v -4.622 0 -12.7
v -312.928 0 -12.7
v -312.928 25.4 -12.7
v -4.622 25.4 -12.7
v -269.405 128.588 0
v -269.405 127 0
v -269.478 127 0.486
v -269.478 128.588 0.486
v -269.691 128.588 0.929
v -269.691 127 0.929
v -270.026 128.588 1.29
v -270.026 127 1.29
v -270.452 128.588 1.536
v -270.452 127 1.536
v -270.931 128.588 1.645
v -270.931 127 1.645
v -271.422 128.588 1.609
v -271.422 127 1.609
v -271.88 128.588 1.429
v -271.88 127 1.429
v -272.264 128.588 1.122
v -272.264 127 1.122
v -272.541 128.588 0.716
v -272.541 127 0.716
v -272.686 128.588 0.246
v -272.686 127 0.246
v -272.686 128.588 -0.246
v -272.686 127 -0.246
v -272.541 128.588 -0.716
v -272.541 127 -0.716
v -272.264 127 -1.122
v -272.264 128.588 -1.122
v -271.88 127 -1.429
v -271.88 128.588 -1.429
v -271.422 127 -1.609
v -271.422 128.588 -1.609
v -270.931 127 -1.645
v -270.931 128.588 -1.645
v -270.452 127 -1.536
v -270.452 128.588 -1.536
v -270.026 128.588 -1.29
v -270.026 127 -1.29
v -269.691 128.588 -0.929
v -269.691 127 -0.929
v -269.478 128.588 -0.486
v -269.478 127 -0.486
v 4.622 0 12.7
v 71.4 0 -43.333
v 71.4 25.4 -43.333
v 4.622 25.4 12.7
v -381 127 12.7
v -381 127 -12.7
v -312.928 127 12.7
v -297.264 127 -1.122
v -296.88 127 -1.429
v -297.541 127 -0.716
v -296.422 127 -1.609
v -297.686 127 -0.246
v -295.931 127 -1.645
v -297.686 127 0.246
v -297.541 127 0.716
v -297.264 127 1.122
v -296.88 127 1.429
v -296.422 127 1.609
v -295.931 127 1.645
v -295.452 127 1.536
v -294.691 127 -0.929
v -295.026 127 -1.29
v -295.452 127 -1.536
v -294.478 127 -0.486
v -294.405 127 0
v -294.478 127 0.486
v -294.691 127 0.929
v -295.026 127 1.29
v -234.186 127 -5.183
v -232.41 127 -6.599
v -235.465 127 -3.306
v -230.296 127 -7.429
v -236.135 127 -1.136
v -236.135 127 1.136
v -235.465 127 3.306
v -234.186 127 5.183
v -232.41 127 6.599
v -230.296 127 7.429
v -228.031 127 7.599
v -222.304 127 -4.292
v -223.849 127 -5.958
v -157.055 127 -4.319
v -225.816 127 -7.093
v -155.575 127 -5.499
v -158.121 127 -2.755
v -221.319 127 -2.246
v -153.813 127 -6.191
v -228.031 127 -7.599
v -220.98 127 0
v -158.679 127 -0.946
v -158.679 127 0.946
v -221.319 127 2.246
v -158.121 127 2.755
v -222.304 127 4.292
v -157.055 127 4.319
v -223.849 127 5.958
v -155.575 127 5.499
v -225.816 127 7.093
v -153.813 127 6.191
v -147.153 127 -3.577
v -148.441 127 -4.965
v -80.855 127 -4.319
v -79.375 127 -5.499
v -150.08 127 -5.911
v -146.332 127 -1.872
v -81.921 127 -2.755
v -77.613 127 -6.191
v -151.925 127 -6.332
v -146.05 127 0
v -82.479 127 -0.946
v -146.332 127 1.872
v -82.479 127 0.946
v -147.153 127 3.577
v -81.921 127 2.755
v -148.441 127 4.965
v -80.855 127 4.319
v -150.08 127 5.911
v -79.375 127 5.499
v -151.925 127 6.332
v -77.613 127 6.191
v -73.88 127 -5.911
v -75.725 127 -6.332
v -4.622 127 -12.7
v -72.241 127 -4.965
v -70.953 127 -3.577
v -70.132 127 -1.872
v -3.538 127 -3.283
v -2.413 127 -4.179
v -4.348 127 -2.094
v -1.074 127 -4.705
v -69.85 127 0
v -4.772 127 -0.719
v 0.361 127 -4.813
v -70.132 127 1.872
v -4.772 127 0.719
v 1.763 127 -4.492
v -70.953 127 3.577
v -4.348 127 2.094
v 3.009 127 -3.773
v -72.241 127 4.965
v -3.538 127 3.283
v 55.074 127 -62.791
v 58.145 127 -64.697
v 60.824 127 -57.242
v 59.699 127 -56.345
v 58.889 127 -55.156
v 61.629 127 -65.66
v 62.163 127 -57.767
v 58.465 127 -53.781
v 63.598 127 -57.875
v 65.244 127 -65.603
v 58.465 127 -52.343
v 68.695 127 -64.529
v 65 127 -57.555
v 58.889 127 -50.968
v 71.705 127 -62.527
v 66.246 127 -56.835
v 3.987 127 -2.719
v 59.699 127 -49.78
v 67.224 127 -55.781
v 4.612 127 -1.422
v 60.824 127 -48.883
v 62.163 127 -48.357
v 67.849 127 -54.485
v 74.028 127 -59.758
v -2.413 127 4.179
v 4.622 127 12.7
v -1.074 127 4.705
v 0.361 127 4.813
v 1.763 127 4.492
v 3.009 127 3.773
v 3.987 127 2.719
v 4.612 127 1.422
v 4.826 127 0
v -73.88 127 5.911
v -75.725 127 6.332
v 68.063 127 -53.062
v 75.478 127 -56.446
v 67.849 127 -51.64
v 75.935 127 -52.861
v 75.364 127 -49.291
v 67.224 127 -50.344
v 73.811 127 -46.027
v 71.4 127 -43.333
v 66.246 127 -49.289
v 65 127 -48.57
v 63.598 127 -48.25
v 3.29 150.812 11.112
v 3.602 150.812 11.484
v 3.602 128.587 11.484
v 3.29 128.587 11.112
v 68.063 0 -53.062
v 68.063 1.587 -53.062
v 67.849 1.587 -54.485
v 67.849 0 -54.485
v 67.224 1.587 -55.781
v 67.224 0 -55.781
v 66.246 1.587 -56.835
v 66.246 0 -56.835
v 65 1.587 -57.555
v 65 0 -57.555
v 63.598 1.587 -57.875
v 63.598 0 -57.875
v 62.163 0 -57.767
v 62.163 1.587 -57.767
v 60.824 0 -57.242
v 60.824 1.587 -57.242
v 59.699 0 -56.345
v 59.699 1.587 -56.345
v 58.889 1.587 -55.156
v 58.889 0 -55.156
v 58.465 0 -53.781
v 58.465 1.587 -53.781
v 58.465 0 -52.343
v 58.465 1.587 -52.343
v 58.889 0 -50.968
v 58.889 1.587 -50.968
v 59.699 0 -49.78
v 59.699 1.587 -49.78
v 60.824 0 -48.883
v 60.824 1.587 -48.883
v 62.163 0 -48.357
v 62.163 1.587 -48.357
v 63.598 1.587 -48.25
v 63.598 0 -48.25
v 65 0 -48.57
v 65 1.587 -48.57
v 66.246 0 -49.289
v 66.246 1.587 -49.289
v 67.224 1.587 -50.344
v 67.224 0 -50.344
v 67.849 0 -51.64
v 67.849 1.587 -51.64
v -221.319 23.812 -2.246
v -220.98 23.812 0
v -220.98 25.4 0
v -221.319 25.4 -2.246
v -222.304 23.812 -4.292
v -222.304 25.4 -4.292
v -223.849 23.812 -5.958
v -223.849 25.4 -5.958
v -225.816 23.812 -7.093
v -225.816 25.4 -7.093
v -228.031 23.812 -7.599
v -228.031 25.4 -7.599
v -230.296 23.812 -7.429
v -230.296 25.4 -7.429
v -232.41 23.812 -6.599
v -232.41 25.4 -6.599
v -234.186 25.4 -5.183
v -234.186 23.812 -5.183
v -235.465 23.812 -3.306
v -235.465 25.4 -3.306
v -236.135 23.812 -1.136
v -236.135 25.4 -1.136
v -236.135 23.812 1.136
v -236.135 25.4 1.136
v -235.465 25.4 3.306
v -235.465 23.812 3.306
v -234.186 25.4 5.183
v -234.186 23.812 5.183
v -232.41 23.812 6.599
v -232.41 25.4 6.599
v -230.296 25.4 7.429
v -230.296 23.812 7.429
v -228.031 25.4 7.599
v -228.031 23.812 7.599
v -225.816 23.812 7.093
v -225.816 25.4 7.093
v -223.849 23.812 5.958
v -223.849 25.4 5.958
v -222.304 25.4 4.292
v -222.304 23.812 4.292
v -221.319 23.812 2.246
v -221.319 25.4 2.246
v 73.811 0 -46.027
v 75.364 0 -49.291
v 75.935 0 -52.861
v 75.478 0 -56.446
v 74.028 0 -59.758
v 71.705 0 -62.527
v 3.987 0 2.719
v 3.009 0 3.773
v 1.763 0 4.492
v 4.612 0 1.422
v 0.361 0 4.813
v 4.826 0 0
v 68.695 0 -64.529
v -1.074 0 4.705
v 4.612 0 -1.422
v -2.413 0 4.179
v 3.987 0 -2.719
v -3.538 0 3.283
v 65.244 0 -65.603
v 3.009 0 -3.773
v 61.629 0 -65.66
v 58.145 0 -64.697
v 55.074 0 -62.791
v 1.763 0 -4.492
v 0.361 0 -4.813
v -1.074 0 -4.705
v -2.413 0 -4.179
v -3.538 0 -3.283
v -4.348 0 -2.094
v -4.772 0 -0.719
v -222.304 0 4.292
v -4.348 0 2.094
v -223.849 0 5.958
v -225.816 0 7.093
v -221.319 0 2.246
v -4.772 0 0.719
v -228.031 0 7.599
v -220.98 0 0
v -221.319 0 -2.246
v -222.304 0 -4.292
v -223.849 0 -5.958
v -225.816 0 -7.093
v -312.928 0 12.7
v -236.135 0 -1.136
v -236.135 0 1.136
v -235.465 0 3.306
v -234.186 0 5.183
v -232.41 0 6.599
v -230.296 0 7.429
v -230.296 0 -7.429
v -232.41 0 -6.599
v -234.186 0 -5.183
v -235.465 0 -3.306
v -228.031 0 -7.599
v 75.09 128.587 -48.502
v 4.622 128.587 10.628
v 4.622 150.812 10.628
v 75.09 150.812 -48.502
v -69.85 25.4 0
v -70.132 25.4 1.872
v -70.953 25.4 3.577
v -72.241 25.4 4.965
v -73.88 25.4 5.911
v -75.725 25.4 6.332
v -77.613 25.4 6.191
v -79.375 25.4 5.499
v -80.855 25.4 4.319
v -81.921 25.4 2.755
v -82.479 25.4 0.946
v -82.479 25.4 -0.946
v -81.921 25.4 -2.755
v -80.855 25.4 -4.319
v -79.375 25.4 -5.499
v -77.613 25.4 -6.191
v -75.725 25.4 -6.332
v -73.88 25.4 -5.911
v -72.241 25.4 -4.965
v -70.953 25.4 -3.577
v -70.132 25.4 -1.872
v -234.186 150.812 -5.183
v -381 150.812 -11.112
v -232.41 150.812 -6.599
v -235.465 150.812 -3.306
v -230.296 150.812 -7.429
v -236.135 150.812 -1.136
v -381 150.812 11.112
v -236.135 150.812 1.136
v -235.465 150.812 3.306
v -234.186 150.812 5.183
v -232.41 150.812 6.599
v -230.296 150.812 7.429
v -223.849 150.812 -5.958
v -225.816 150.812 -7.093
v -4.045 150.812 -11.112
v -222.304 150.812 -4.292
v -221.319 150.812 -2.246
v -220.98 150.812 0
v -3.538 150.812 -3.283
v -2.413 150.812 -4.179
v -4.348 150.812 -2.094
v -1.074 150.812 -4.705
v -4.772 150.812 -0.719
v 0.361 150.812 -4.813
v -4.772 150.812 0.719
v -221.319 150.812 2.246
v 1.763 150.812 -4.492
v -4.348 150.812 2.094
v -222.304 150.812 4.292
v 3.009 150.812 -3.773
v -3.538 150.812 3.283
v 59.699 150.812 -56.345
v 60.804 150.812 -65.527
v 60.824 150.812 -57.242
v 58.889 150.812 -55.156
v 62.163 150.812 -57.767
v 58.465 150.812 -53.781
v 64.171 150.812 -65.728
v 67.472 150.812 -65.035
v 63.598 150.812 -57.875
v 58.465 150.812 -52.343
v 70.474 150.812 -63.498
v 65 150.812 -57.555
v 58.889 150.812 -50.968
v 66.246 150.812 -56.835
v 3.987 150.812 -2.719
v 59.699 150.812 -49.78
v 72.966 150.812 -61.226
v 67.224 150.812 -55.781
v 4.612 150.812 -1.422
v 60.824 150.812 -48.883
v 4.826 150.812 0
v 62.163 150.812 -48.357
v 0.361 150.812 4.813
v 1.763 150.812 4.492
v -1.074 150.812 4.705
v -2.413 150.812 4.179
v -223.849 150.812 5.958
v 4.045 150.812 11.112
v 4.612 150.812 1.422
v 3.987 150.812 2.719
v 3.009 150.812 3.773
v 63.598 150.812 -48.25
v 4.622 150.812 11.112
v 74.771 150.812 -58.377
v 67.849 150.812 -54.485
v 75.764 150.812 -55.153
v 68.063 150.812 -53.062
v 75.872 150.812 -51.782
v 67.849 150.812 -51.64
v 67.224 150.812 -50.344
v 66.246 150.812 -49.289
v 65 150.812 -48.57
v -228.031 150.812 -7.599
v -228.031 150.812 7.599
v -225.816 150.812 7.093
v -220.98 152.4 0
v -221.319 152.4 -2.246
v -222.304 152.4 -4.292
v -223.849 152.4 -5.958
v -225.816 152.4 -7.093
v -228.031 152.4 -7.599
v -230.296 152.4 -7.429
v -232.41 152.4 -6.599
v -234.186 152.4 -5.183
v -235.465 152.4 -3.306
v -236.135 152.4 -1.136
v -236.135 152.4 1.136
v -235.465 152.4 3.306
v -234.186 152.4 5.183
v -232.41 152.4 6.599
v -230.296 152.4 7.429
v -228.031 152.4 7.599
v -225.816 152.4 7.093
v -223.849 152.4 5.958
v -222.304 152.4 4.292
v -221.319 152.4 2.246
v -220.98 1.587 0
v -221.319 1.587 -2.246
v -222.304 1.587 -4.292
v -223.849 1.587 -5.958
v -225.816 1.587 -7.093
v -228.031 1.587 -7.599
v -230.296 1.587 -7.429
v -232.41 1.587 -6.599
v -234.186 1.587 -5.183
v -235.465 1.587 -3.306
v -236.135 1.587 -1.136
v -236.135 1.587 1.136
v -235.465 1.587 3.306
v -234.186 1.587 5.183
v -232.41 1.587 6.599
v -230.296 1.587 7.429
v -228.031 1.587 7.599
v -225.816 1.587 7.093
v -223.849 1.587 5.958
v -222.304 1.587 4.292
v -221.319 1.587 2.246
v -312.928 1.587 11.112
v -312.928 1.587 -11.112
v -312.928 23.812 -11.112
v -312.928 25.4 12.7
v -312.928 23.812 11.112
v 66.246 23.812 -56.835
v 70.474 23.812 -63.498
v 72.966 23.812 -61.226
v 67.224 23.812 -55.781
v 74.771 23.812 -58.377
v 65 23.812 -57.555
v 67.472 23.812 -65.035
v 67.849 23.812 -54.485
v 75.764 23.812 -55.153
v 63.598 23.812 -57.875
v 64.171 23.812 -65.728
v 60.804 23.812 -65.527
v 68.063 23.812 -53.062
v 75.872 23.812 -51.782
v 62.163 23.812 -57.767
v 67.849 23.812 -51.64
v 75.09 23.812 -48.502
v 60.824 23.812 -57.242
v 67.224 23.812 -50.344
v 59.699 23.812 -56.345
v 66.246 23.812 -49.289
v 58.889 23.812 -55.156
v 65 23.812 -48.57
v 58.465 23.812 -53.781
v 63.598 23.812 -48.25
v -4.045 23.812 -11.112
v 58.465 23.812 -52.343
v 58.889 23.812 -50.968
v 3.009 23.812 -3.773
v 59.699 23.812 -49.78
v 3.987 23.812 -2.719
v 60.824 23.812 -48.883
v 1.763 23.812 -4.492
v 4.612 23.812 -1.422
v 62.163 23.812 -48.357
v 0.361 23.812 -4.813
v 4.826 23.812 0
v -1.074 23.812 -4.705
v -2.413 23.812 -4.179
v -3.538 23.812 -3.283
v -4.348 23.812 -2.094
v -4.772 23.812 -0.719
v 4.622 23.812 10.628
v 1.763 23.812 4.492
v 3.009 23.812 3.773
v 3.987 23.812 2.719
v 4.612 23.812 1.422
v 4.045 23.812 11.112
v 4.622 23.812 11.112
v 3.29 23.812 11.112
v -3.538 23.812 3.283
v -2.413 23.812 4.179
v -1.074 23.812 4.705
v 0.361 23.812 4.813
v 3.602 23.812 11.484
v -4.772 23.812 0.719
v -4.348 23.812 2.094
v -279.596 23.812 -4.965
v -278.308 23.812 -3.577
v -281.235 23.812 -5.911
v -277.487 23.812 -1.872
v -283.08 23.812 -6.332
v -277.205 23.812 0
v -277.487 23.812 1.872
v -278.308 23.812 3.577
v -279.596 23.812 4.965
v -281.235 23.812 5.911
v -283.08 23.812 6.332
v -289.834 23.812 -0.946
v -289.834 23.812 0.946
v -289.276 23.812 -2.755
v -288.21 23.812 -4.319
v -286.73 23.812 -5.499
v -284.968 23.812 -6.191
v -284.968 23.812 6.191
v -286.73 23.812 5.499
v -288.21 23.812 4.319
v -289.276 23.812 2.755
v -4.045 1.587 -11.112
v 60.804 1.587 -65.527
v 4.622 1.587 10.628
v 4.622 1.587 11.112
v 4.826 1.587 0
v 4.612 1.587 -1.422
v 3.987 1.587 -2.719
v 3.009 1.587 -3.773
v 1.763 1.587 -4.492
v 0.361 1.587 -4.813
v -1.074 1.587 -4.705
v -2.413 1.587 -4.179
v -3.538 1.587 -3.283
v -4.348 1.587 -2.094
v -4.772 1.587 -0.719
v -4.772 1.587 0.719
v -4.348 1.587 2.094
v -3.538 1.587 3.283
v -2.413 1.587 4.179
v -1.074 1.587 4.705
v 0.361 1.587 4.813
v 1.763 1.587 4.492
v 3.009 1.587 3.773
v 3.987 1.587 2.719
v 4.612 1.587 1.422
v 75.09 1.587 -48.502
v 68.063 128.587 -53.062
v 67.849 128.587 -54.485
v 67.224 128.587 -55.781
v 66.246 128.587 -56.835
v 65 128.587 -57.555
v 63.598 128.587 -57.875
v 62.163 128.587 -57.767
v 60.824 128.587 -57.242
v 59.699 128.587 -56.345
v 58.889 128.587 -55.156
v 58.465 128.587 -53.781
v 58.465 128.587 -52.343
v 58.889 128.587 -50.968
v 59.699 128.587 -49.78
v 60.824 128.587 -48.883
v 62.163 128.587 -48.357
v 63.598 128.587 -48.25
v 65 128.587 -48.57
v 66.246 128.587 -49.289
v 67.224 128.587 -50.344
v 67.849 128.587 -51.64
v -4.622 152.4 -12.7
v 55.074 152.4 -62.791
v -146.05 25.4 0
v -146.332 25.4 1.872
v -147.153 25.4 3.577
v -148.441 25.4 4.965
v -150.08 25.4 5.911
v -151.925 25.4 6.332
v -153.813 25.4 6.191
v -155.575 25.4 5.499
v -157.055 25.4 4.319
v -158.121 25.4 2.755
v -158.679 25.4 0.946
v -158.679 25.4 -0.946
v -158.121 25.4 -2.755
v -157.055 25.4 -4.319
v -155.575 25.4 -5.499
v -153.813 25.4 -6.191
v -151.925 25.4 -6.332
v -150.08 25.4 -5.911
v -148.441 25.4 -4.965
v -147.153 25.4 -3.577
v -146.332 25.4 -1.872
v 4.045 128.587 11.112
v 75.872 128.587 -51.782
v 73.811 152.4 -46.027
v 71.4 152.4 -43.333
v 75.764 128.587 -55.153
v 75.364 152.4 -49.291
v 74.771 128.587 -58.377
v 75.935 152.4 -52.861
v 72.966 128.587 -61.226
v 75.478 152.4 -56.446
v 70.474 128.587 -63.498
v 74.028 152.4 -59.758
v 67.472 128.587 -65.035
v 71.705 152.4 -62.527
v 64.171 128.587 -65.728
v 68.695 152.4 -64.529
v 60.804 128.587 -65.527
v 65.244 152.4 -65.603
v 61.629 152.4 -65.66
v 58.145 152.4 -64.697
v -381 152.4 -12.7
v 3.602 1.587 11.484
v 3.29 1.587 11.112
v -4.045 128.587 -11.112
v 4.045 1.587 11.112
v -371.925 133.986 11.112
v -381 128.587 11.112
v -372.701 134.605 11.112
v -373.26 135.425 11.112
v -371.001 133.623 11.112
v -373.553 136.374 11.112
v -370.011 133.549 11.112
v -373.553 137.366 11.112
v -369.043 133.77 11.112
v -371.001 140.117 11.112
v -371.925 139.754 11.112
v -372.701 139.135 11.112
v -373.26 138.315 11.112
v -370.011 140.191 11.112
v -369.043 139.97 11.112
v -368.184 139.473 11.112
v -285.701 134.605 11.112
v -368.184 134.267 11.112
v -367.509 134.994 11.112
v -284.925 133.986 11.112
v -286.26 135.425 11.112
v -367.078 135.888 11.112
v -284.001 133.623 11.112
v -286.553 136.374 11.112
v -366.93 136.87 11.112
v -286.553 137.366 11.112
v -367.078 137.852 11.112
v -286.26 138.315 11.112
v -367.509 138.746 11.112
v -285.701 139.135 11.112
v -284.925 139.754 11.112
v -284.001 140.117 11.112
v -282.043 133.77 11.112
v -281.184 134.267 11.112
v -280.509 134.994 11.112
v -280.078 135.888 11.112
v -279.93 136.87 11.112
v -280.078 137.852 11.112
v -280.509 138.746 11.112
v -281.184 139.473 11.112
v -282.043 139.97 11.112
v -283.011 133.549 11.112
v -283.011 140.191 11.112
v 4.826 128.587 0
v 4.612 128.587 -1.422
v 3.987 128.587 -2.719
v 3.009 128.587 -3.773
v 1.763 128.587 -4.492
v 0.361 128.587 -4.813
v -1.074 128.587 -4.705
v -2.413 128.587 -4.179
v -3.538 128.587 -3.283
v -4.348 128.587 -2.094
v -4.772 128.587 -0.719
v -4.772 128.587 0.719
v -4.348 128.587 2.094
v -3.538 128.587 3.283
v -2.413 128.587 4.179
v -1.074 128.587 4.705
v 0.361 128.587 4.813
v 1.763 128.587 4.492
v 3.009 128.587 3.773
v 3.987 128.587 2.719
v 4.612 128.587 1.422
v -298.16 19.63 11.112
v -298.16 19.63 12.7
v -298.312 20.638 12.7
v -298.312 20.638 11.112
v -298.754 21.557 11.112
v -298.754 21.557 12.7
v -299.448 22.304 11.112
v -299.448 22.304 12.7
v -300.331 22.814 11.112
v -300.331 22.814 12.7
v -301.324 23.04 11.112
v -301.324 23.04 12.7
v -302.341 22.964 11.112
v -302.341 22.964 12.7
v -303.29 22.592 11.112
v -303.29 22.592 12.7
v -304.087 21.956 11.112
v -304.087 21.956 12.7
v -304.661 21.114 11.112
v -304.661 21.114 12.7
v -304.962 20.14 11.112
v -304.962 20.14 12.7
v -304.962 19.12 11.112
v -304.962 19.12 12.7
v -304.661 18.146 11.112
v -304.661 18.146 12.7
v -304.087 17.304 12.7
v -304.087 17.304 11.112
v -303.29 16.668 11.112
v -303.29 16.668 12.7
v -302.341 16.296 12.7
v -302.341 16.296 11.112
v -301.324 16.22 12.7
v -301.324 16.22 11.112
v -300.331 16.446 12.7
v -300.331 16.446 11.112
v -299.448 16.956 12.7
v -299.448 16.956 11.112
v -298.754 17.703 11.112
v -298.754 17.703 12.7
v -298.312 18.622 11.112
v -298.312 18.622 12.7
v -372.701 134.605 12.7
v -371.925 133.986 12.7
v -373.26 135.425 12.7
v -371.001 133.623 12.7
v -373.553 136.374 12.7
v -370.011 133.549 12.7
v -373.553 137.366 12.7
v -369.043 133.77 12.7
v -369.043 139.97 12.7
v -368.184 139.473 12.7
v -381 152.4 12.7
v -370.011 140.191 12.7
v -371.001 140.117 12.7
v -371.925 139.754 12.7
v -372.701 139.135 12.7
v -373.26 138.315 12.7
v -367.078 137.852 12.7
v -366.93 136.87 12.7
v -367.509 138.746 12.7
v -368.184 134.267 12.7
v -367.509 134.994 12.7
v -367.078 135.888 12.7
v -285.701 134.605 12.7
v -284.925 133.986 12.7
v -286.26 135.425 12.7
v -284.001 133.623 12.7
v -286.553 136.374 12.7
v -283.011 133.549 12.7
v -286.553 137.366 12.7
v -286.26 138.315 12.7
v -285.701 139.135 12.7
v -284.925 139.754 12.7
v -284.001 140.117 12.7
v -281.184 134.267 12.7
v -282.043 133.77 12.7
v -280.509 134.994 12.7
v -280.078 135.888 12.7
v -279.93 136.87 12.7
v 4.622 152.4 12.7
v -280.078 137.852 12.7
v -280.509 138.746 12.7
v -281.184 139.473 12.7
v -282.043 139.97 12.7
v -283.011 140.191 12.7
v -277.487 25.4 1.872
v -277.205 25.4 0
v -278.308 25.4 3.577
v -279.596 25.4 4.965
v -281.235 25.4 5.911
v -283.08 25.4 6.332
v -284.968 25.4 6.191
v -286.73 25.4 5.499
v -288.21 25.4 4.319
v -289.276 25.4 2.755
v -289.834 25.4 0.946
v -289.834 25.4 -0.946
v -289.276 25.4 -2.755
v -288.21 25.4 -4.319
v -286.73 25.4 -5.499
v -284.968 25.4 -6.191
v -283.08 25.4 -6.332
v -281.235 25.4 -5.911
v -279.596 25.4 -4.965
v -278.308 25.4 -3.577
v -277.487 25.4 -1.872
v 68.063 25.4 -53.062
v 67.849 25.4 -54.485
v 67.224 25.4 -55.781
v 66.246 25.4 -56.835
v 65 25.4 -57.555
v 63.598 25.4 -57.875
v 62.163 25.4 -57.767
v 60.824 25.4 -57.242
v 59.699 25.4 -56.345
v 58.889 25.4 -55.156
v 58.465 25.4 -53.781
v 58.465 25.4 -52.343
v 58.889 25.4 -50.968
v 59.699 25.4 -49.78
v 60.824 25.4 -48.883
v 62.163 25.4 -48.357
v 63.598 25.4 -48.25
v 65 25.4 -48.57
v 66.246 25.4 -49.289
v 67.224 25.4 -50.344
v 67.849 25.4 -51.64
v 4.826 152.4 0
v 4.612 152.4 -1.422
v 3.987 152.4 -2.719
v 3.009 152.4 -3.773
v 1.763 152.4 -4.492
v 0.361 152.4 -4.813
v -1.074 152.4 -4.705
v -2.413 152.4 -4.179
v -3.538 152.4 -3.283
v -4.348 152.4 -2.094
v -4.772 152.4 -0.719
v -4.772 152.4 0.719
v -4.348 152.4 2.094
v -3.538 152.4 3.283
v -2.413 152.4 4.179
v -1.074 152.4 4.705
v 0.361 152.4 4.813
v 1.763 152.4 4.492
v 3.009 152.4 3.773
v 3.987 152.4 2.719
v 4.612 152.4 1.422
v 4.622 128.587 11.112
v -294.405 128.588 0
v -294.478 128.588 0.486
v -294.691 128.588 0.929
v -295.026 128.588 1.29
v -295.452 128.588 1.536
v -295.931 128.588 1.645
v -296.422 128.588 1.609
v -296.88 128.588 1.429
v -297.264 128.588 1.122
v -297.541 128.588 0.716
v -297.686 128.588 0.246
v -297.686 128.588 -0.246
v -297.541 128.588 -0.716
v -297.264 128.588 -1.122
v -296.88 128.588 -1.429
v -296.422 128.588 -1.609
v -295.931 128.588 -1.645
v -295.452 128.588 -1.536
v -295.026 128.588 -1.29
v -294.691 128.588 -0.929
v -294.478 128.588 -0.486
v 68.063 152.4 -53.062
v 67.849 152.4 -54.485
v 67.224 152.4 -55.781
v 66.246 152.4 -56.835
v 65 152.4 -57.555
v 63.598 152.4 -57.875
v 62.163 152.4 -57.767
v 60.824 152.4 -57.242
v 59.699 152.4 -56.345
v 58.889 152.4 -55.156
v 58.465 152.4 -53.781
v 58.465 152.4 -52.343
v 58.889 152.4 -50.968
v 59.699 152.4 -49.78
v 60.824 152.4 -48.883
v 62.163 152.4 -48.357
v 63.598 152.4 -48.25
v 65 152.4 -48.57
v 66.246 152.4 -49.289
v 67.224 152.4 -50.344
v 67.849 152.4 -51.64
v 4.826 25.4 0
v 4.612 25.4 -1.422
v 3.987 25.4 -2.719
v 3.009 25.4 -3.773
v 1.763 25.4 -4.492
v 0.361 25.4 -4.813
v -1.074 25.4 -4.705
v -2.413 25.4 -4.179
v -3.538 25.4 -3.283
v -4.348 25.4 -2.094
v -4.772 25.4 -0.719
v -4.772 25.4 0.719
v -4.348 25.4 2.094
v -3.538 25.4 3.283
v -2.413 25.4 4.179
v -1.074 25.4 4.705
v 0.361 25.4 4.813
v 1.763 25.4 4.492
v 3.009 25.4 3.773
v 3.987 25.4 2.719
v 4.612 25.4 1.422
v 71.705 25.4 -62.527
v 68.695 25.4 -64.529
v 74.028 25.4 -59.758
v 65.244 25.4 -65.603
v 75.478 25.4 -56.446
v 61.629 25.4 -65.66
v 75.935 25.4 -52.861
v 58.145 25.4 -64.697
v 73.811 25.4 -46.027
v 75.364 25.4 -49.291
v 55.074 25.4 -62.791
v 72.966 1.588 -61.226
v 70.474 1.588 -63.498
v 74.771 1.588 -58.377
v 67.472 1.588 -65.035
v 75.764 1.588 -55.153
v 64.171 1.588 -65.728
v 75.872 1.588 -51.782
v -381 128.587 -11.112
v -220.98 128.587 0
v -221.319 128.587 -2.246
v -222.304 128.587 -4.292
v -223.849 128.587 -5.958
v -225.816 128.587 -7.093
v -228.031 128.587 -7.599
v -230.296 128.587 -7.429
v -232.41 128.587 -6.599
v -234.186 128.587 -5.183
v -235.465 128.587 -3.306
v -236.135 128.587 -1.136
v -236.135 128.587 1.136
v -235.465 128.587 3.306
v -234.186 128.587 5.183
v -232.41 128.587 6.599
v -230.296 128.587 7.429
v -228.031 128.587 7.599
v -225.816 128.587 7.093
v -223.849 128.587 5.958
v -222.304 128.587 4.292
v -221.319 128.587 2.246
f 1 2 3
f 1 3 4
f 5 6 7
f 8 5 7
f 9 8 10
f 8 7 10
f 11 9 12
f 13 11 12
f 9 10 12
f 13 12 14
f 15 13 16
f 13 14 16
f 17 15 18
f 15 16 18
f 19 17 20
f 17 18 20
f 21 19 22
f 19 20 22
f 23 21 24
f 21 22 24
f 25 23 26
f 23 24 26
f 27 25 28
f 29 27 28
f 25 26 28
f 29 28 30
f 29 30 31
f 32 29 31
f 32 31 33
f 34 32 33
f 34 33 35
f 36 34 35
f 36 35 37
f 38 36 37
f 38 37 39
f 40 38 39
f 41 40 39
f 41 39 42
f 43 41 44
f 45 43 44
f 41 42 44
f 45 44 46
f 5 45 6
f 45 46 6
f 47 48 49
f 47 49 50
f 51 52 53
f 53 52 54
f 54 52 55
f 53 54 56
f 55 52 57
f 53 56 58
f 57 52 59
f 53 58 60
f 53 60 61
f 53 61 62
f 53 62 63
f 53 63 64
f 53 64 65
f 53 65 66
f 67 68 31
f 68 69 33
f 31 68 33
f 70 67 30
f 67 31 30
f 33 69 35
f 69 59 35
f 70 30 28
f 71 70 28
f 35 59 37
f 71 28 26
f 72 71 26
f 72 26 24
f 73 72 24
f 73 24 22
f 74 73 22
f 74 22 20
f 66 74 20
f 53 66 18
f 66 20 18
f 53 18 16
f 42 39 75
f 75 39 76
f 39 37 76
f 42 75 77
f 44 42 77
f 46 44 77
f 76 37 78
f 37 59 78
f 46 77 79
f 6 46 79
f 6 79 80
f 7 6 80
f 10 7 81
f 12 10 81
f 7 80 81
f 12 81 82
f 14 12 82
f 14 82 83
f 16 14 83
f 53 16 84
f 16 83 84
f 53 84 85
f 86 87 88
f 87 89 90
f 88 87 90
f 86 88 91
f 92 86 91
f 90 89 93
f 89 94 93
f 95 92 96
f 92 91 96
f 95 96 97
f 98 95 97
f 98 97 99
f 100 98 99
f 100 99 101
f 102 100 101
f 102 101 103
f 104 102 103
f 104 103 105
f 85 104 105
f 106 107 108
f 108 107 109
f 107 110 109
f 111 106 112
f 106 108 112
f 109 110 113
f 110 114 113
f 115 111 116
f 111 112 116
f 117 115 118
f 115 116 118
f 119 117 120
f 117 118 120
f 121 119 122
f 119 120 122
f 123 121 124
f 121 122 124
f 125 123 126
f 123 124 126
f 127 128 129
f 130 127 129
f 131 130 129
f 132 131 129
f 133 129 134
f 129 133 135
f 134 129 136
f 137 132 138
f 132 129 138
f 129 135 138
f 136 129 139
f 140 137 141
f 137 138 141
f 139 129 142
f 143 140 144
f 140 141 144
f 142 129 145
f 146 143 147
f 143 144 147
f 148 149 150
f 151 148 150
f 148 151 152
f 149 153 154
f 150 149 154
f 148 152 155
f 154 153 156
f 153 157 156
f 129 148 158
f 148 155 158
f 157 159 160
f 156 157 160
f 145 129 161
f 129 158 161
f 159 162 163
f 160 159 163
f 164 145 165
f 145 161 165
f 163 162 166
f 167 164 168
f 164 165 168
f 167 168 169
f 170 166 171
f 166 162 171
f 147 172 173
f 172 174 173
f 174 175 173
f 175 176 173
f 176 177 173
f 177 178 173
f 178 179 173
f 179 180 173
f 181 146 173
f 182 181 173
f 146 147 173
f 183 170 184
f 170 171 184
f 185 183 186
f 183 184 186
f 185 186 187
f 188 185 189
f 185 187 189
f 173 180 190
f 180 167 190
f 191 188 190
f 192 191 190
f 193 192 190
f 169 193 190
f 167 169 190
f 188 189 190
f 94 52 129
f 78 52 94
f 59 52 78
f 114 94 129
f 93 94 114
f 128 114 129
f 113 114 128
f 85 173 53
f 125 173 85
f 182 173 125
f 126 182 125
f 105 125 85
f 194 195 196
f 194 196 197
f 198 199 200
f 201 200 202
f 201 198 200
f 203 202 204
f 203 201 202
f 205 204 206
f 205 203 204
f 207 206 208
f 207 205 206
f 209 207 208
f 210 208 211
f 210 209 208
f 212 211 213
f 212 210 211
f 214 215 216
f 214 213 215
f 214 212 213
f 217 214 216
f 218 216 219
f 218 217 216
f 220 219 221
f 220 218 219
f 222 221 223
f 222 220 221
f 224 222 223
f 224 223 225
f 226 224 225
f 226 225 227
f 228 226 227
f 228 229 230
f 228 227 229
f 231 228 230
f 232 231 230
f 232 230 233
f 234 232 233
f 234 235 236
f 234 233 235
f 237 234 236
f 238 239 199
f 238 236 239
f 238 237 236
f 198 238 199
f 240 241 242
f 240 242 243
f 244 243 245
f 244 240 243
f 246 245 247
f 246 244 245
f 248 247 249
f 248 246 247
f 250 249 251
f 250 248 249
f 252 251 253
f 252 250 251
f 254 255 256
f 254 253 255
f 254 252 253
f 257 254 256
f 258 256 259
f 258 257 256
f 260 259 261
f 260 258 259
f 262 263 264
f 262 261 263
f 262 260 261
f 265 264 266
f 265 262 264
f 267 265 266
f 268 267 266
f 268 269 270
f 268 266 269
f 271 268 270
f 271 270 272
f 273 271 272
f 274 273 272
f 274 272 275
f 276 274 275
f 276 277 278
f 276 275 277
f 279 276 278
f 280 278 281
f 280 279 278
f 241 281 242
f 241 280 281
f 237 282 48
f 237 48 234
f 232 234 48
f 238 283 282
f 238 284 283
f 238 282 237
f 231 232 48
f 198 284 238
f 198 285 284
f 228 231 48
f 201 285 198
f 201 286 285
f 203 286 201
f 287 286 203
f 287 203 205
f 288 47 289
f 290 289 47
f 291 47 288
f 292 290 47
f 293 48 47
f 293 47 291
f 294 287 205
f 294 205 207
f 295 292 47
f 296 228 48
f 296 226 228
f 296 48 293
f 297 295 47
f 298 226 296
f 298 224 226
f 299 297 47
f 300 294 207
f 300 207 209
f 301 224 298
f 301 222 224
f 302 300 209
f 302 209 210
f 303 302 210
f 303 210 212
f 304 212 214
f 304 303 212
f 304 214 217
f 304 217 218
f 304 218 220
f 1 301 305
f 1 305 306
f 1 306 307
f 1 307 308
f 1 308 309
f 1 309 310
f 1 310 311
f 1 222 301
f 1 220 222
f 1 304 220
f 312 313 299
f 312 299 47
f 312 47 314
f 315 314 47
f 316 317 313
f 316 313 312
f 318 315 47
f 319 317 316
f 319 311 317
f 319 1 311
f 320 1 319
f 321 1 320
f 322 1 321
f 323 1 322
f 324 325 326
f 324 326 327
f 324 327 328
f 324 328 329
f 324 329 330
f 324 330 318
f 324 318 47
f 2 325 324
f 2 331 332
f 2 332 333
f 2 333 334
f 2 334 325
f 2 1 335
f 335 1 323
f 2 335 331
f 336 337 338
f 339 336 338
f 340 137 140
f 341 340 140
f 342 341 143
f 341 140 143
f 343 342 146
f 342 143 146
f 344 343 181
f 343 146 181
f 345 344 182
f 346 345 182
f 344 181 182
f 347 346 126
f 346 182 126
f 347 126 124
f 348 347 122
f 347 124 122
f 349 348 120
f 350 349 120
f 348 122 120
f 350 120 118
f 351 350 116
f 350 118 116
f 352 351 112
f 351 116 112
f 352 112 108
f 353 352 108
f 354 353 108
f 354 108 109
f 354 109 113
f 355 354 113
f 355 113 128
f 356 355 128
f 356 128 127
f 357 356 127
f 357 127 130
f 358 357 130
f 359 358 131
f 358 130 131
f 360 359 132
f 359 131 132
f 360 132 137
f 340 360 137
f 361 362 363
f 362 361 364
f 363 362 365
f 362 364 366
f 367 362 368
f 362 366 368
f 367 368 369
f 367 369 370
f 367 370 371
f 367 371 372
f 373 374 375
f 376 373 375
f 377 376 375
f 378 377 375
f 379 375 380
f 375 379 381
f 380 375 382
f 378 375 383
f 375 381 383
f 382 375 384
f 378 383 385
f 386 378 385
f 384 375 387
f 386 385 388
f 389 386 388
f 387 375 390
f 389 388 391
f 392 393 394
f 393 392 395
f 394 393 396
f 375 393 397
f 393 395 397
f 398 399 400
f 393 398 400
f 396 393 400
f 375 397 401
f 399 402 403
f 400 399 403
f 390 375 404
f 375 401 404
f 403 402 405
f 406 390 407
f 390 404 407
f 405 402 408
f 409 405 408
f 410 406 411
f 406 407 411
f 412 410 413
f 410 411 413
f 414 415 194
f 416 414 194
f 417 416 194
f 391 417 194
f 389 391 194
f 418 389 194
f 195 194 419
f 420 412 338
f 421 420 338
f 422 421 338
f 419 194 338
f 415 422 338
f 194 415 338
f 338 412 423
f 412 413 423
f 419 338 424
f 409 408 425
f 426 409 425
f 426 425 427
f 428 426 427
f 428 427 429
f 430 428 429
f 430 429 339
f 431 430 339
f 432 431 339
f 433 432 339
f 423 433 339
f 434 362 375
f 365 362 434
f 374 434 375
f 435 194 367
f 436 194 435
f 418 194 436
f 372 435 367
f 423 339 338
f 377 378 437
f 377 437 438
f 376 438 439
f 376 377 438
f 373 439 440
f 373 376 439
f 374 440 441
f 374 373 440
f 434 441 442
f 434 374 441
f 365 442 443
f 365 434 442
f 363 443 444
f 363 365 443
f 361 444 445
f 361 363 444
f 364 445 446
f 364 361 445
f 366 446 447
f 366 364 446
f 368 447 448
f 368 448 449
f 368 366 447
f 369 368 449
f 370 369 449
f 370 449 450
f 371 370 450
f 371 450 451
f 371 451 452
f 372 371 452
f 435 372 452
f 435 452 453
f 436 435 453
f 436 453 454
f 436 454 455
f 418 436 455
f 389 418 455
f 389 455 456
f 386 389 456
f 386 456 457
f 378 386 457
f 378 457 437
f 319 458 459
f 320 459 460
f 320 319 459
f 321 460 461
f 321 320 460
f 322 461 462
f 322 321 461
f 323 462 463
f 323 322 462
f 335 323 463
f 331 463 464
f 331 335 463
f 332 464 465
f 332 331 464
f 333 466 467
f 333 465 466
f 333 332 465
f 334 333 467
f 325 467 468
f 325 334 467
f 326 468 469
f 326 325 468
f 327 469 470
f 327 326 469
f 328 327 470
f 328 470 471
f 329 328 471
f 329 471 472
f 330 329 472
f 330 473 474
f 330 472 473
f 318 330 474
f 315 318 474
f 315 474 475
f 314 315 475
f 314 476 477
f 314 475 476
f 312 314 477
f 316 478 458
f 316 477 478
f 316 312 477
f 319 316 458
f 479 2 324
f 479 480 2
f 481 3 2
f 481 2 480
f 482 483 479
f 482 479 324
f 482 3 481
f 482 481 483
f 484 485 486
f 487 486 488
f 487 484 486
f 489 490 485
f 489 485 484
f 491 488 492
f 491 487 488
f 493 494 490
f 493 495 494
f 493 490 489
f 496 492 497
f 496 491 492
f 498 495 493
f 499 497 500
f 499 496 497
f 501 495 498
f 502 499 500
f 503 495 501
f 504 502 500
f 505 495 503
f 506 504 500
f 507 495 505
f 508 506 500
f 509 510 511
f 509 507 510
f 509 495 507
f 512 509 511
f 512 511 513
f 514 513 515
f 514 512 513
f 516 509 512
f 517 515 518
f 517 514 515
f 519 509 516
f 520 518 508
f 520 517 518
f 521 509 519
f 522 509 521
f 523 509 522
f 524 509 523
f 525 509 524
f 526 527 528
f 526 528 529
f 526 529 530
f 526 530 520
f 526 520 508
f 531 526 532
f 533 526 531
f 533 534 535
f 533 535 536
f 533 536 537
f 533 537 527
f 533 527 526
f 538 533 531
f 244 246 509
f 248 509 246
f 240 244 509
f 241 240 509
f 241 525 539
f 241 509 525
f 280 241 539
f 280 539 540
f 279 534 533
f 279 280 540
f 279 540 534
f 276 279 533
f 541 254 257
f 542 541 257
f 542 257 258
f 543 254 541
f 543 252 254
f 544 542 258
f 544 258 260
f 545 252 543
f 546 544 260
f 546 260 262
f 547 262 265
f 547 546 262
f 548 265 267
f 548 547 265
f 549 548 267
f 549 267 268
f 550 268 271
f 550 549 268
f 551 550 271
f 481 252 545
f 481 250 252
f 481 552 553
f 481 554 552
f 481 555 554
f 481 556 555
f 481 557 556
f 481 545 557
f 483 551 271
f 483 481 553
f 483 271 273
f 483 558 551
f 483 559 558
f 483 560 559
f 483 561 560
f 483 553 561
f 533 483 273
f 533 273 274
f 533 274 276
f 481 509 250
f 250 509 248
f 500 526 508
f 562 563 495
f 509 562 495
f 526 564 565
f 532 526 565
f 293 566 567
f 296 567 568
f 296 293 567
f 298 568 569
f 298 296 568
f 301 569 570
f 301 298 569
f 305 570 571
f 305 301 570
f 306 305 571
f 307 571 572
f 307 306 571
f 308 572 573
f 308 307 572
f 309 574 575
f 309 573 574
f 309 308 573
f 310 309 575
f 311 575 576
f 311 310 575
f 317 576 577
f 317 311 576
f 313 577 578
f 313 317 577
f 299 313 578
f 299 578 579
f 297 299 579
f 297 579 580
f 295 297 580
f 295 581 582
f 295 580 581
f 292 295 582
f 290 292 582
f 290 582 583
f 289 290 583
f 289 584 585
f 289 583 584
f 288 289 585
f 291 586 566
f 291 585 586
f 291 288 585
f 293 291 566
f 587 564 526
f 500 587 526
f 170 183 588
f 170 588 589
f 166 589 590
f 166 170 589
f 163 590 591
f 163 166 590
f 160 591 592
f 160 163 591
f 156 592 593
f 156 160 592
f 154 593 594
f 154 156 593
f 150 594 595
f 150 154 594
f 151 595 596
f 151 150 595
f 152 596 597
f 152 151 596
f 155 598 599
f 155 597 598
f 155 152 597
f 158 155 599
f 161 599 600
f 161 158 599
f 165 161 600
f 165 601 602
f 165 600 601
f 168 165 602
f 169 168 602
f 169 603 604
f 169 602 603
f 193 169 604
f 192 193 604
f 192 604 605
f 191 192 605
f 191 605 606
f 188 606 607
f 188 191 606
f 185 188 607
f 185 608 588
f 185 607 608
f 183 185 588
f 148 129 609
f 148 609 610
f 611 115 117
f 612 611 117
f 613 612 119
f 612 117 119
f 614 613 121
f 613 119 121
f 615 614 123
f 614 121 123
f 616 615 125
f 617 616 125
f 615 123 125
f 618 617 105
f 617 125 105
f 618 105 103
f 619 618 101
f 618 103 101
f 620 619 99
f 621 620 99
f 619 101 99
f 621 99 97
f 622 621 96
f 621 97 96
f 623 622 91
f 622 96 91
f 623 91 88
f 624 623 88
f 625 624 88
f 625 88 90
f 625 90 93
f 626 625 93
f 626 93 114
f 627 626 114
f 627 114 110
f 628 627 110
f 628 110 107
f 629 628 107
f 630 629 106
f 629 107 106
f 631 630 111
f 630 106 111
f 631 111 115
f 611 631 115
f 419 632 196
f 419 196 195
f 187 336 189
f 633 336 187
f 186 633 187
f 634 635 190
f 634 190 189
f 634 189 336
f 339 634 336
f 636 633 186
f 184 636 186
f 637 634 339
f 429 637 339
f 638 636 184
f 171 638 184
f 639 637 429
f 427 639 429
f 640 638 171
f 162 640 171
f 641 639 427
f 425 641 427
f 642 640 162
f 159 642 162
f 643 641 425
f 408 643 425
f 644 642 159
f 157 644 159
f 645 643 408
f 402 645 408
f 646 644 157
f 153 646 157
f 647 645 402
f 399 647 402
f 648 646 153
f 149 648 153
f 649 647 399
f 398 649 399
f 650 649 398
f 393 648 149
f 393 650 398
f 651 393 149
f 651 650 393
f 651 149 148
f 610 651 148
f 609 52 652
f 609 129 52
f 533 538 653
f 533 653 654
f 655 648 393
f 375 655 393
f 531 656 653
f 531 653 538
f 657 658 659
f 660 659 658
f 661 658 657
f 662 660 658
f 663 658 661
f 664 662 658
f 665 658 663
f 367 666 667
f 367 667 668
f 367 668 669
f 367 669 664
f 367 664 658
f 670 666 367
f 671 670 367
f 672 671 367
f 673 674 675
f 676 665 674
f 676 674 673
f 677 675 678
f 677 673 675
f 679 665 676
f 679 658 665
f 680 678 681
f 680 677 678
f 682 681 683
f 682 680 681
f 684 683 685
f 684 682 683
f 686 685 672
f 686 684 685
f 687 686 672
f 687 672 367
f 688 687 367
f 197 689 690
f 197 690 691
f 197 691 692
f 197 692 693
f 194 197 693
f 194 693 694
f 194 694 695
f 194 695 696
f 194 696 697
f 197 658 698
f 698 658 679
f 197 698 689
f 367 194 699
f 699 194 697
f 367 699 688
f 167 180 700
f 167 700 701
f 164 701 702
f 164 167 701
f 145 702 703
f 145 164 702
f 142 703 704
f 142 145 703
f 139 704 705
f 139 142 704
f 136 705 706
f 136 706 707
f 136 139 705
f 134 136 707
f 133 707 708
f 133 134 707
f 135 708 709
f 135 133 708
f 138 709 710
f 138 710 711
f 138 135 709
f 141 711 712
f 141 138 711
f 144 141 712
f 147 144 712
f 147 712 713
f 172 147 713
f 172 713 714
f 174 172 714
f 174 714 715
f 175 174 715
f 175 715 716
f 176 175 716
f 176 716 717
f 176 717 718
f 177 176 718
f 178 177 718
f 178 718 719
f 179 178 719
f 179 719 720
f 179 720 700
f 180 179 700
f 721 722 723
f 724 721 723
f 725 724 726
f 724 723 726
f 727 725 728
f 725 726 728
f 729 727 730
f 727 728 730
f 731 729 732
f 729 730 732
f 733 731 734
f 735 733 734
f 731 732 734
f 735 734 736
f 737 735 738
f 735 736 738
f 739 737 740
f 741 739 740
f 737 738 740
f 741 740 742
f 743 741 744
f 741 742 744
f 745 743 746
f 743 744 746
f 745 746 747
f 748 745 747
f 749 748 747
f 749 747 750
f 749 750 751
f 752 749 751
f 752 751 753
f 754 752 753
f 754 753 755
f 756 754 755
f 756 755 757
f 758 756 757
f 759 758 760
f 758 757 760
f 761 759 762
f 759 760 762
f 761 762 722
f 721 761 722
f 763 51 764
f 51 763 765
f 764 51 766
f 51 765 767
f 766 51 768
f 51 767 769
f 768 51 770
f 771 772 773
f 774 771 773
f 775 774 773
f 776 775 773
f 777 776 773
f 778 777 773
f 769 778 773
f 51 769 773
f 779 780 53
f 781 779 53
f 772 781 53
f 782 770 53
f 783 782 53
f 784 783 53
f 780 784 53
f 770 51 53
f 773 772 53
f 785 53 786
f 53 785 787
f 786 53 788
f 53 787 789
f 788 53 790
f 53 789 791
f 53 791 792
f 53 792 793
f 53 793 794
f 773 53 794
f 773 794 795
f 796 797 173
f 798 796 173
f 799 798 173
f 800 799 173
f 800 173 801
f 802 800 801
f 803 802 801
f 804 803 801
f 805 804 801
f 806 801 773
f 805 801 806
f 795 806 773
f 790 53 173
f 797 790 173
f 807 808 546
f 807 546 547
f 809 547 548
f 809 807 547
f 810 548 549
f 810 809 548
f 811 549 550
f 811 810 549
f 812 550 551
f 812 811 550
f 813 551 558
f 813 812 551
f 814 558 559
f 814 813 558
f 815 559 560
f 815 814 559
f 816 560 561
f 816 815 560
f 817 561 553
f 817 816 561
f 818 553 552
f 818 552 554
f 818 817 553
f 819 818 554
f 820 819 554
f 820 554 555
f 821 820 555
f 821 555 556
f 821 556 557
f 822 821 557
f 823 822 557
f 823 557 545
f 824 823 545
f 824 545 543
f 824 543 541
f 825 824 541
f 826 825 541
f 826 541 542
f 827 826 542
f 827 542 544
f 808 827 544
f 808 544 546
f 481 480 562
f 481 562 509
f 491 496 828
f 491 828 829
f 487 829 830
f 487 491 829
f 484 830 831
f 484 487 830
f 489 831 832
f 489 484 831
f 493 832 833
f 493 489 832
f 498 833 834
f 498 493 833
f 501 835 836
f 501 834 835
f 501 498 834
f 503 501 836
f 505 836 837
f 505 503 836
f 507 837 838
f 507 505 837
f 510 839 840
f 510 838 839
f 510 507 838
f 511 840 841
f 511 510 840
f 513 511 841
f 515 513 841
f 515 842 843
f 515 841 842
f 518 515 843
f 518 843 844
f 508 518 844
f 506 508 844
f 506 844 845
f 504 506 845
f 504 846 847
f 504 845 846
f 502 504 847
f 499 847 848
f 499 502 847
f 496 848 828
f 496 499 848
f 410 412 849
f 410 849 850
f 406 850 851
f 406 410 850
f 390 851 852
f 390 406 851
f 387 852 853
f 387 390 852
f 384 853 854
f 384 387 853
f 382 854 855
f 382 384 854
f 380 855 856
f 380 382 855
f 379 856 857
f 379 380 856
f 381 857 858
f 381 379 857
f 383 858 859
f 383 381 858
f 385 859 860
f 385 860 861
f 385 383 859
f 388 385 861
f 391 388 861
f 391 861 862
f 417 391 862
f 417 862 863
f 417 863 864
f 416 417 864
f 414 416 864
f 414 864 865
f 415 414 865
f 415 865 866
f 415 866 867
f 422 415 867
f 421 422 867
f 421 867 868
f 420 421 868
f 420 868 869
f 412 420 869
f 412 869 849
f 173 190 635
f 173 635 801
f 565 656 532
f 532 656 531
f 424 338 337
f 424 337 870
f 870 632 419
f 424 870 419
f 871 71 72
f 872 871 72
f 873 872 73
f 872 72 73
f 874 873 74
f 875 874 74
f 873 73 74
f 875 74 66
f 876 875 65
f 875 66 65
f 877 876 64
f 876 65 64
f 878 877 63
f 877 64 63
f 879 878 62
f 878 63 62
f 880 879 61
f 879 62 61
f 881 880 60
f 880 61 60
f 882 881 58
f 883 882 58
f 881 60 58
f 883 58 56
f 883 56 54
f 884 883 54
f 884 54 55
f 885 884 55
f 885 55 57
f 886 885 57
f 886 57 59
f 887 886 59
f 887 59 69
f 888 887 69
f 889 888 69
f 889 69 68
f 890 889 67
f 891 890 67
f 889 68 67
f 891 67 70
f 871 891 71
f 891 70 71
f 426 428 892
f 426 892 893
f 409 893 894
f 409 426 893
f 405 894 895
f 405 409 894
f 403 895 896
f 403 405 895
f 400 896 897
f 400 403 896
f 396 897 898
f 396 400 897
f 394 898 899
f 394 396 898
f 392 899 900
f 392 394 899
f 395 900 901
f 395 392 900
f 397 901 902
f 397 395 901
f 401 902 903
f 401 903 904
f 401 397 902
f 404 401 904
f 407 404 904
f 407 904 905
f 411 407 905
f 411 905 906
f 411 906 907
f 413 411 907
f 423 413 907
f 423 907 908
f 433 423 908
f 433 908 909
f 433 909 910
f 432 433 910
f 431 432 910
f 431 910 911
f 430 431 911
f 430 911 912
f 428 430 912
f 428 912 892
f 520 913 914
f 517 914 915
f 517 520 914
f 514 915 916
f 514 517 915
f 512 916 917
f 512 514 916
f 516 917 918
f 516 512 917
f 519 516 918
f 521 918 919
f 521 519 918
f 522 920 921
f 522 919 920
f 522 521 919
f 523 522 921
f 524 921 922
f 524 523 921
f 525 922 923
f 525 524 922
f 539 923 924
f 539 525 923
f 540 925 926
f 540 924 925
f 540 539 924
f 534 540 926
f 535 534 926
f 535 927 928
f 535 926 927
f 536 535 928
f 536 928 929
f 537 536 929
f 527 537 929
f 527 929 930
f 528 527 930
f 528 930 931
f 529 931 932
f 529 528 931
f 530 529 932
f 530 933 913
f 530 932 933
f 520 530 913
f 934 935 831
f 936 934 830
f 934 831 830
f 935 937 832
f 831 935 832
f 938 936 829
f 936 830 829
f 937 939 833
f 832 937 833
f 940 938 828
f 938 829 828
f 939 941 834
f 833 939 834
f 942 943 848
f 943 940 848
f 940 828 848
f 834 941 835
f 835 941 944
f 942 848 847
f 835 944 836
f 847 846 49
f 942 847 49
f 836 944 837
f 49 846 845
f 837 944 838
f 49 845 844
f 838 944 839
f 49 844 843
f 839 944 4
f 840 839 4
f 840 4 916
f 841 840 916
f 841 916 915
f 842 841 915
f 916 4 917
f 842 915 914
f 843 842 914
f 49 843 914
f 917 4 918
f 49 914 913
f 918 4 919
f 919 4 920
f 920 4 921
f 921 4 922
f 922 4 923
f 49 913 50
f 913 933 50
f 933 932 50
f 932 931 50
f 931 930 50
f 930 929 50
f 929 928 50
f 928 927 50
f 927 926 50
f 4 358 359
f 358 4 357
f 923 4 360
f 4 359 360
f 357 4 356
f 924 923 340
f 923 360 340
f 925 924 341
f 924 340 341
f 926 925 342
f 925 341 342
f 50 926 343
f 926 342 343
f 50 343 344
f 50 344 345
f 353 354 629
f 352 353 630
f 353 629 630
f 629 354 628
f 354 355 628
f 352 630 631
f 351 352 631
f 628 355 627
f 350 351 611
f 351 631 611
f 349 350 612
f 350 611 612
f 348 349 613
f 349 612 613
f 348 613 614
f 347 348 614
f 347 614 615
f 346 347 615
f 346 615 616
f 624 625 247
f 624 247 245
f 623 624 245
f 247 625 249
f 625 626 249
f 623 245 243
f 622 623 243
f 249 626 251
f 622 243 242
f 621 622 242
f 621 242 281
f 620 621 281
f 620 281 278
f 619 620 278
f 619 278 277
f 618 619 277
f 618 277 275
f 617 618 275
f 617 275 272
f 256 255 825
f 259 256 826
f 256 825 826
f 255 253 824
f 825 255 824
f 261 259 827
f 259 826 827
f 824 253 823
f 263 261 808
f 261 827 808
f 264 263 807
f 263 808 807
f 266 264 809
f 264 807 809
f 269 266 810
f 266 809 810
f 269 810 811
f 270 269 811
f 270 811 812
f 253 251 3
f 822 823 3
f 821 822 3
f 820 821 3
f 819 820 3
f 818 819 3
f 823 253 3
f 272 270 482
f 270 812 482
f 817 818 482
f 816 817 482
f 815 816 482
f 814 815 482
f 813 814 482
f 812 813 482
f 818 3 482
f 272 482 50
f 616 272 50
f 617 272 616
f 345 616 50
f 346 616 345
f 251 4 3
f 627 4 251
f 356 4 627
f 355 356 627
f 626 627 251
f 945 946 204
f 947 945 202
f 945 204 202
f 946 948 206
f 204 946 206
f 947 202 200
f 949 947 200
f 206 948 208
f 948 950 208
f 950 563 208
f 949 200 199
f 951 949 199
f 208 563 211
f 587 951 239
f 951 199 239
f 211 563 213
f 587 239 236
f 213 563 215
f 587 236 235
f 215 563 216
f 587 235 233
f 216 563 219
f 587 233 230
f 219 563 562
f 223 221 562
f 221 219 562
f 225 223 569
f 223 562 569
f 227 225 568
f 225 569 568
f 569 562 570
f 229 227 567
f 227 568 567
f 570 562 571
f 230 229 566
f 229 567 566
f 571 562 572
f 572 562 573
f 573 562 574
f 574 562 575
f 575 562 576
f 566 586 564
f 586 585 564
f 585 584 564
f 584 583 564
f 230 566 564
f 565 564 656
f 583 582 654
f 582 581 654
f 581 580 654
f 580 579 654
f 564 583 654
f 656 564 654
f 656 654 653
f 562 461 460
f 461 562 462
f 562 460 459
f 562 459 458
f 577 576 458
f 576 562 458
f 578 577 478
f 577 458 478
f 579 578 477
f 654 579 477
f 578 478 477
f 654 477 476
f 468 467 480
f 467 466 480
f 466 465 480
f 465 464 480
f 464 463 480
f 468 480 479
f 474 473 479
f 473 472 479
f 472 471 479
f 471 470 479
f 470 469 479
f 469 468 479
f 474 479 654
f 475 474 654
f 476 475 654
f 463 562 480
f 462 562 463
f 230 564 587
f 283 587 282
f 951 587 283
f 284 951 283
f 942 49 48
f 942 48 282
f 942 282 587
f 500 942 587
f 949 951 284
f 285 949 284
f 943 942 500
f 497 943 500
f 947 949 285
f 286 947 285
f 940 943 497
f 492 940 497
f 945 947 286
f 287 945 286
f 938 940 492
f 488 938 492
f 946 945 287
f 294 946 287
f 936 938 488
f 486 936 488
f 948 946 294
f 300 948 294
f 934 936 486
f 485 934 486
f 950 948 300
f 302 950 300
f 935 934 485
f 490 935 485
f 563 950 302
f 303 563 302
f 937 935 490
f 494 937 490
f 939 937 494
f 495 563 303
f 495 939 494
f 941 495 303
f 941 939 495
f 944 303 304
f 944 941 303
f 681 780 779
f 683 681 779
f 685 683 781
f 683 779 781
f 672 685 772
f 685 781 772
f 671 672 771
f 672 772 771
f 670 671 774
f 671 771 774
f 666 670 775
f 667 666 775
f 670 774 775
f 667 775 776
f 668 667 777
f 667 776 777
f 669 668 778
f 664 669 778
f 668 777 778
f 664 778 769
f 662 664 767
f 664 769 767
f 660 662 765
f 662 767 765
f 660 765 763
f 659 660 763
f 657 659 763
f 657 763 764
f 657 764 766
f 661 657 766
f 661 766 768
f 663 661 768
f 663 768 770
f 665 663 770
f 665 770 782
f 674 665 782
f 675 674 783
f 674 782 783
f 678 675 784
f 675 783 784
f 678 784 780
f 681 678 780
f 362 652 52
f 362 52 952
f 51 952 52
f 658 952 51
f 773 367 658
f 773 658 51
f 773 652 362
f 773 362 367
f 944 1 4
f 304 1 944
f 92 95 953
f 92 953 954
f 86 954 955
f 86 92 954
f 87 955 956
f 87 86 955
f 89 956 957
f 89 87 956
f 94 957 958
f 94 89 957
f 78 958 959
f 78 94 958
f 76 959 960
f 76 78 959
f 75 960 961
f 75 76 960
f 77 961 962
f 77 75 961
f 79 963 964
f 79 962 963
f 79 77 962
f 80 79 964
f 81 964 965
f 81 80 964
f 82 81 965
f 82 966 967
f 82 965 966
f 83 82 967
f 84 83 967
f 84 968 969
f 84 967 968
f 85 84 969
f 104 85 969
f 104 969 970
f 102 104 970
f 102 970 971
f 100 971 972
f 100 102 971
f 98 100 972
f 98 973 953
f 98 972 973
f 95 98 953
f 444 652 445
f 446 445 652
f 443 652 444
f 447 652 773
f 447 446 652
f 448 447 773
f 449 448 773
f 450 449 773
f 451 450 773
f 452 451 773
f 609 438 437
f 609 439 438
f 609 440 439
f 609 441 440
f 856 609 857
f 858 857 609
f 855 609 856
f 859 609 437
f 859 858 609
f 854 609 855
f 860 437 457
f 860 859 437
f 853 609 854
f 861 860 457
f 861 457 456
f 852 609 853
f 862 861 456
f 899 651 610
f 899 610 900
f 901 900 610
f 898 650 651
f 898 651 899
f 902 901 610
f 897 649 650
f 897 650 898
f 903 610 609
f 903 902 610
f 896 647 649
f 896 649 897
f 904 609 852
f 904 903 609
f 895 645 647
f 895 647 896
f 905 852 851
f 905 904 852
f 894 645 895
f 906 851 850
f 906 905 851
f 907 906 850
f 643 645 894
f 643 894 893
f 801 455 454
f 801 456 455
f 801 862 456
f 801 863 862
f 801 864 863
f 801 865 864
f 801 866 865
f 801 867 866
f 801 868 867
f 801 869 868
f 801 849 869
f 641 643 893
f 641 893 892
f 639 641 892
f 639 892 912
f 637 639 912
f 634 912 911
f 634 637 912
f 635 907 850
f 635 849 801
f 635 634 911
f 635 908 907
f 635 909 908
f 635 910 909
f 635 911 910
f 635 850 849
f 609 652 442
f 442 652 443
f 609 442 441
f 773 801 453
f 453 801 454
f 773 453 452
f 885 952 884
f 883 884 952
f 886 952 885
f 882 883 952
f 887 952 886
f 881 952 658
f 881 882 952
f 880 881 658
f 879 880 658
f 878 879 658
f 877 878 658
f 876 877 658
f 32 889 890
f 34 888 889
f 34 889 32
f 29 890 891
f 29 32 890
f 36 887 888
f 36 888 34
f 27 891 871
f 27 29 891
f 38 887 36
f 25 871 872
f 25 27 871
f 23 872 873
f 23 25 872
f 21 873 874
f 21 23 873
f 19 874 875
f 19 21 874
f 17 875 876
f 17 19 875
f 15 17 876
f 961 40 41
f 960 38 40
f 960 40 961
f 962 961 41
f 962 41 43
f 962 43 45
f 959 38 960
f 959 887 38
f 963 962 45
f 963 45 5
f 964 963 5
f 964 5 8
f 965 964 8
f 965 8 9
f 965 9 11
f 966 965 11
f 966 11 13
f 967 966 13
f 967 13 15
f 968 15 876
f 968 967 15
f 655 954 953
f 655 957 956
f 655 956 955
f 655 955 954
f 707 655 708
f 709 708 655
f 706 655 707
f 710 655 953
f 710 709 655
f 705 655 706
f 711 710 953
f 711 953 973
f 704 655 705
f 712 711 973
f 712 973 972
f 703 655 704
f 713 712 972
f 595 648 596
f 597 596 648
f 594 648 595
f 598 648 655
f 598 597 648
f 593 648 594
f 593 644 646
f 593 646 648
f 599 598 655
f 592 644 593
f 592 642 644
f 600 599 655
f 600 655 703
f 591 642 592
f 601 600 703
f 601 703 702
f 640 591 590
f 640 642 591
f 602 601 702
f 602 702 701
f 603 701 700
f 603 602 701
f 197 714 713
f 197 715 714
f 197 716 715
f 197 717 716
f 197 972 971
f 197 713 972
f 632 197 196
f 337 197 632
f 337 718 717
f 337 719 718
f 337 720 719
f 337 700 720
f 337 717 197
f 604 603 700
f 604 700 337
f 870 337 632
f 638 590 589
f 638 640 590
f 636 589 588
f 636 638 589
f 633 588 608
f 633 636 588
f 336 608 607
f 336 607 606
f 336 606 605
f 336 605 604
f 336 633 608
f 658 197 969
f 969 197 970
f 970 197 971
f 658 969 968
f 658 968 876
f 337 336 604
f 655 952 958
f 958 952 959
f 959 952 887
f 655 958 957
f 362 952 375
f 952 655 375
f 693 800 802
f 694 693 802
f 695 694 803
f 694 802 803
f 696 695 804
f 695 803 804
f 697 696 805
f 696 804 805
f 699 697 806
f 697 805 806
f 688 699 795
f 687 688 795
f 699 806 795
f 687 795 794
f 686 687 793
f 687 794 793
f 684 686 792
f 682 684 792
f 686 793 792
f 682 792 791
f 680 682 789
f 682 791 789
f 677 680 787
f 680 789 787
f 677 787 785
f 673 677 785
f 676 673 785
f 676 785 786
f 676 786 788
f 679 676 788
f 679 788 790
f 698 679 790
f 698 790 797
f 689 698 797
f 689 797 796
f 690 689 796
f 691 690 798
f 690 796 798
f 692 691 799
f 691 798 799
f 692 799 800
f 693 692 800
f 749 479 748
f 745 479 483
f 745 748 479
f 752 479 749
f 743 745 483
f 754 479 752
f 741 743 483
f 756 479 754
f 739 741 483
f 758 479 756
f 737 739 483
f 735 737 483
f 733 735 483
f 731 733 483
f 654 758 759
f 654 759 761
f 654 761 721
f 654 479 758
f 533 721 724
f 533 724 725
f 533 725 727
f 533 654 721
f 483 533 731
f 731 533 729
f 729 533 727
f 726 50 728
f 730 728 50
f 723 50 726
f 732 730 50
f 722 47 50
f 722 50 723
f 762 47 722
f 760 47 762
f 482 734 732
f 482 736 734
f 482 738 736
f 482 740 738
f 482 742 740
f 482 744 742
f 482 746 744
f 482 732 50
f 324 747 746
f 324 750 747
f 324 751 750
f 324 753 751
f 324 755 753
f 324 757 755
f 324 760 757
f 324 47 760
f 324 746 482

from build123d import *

# Parameters (mm, degrees)
SKETCH4_R           = 4.826
SKETCH4_R_2         = 7.62
BOSS_EXTRUDE3_DEPTH = 152.4
SKETCH5_W           = 22.225
SKETCH5_H           = 22.225
SKETCH5_W_2         = 25.4
SKETCH5_H_2         = 101.6
CUT_EXTRUDE2_DEPTH  = 258.622422
SKETCH6_W           = 25.4
SKETCH6_H           = 101.6
SKETCH6_W_2         = 22.225
SKETCH6_H_2         = 22.225
CUT_EXTRUDE3_DEPTH  = 123.590867
CUT_EXTRUDE4_DEPTH  = 152.4
SKETCH8_R           = 6.35
BOSS_EXTRUDE4_DEPTH = 101.6
SKETCH9_W           = 25.4
SKETCH9_H           = 25.4
SKETCH9_W_2         = 22.225
SKETCH9_H_2         = 22.225
BOSS_EXTRUDE5_DEPTH = 58.928
SKETCH11_R          = 1.65
CUT_EXTRUDE6_DEPTH  = 1.5875
SKETCH12_R          = 6.35
CUT_EXTRUDE7_DEPTH  = 103.1875
SKETCH13_W          = 25.4
SKETCH13_H          = 25.4
SKETCH13_W_2        = 22.225
SKETCH13_H_2        = 22.225
BOSS_EXTRUDE6_DEPTH = 68.072
SKETCH14_R          = 3.33
SKETCH14_R_2        = 3.42
CUT_EXTRUDE8_DEPTH  = 1.5875


with BuildPart() as part:
    # Sketch4 → Boss-Extrude3 (new body)
    with BuildSketch(Plane(origin=(0, 0, 0), x_dir=(1, 0, 0), z_dir=(0, 1, 0))):
        Polygon((-254, -12.7), (-254, 12.7), (-4.622421975, 12.7), (82.971713376, 86.200206667), (99.298518662, 66.742677811), (4.622421975, -12.7), align=None)
        Circle(SKETCH4_R, mode=Mode.SUBTRACT)
        with Locations((63.236968779, 53.06211718)):
            Circle(SKETCH4_R, mode=Mode.SUBTRACT)
        with Locations((-228.6, 0)):
            Circle(SKETCH4_R_2, mode=Mode.SUBTRACT)
    extrude(amount=BOSS_EXTRUDE3_DEPTH)

    # Sketch5 → Cut-Extrude2 (cut)
    with BuildSketch(Plane.ZY.offset(254)):
        with Locations((0, 139.7)):
            Rectangle(SKETCH5_W, SKETCH5_H)
        with Locations((0, 76.2)):
            Rectangle(SKETCH5_W_2, SKETCH5_H_2)
        with Locations((0, 12.7)):
            Rectangle(SKETCH5_W, SKETCH5_H)
    extrude(amount=-CUT_EXTRUDE2_DEPTH, mode=Mode.SUBTRACT)

    # Sketch6 → Cut-Extrude3 (cut)
    with BuildSketch(Plane(origin=(91.135116019, 0, -76.471442239), x_dir=(-0.64278761, 0, -0.766044443), z_dir=(0.766044443, 0, -0.64278761))):
        with Locations((0, 76.2)):
            Rectangle(SKETCH6_W, SKETCH6_H)
        with Locations((0, 139.7)):
            Rectangle(SKETCH6_W_2, SKETCH6_H_2)
        with Locations((0, 12.7)):
            Rectangle(SKETCH6_W_2, SKETCH6_H_2)
    extrude(amount=-CUT_EXTRUDE3_DEPTH, mode=Mode.SUBTRACT)

    # Sketch7 → Cut-Extrude4 (cut)
    with BuildSketch(Plane(origin=(0, 152.4, 0), x_dir=(1, 0, 0), z_dir=(0, 1, 0))):
        with BuildLine():
            Line((55.073566136, 62.790881607), (14.292485888, 190.379547218))
            Line((14.292485888, 190.379547218), (153.844328146, 116.591677596))
            Line((153.844328146, 116.591677596), (141.535463421, -3.473116834))
            Line((141.535463421, -3.473116834), (71.400371422, 43.333352752))
            ThreePointArc((71.400371422, 43.333352752), (72.965733207, 61.225519823), (55.073566136, 62.790881607))
        make_face()
    extrude(amount=-CUT_EXTRUDE4_DEPTH, mode=Mode.SUBTRACT)

    # Sketch8 → Boss-Extrude4 (add)
    with BuildSketch(Plane.XZ.offset(-127)):
        with Locations((-76.2, 0)):
            Circle(SKETCH8_R)
        with Locations((-152.4, 0)):
            Circle(SKETCH8_R)
    extrude(amount=BOSS_EXTRUDE4_DEPTH)

    # Sketch9 → Boss-Extrude5 (add)
    with BuildSketch(Plane.ZY.offset(254)):
        with Locations((0, 139.7)):
            Rectangle(SKETCH9_W, SKETCH9_H)
        with Locations((0, 139.7)):
            Rectangle(SKETCH9_W_2, SKETCH9_H_2, mode=Mode.SUBTRACT)
        with Locations((0, 12.7)):
            Rectangle(SKETCH9_W, SKETCH9_H)
        with Locations((0, 12.7)):
            Rectangle(SKETCH9_W_2, SKETCH9_H_2, mode=Mode.SUBTRACT)
    extrude(amount=BOSS_EXTRUDE5_DEPTH)

    # Sketch11 → Cut-Extrude6 (cut)
    with BuildSketch(Plane.XZ.offset(-127)):
        with Locations((-271.054789466, 0)):
            Circle(SKETCH11_R)
        with Locations((-296.054789466, 0)):
            Circle(SKETCH11_R)
    extrude(amount=-CUT_EXTRUDE6_DEPTH, mode=Mode.SUBTRACT)

    # Sketch12 → Cut-Extrude7 (cut)
    with BuildSketch(Plane.XZ.offset(-127)):
        with Locations((-283.554789466, 0)):
            Circle(SKETCH12_R)
    extrude(amount=CUT_EXTRUDE7_DEPTH, mode=Mode.SUBTRACT)

    # Sketch13 → Boss-Extrude6 (add)
    with BuildSketch(Plane.ZY.offset(312.928)):
        with Locations((0, 139.7)):
            Rectangle(SKETCH13_W, SKETCH13_H)
        with Locations((0, 139.7)):
            Rectangle(SKETCH13_W_2, SKETCH13_H_2, mode=Mode.SUBTRACT)
    extrude(amount=BOSS_EXTRUDE6_DEPTH)

    # Sketch14 → Cut-Extrude8 (cut)
    with BuildSketch(Plane.XY.offset(12.7)):
        with Locations((-370.26, 136.87)):
            Circle(SKETCH14_R)
        with Locations((-283.26, 136.87)):
            Circle(SKETCH14_R)
        with Locations((-301.58, 19.63)):
            Circle(SKETCH14_R_2)
    extrude(amount=-CUT_EXTRUDE8_DEPTH, mode=Mode.SUBTRACT)


solid = part.part
